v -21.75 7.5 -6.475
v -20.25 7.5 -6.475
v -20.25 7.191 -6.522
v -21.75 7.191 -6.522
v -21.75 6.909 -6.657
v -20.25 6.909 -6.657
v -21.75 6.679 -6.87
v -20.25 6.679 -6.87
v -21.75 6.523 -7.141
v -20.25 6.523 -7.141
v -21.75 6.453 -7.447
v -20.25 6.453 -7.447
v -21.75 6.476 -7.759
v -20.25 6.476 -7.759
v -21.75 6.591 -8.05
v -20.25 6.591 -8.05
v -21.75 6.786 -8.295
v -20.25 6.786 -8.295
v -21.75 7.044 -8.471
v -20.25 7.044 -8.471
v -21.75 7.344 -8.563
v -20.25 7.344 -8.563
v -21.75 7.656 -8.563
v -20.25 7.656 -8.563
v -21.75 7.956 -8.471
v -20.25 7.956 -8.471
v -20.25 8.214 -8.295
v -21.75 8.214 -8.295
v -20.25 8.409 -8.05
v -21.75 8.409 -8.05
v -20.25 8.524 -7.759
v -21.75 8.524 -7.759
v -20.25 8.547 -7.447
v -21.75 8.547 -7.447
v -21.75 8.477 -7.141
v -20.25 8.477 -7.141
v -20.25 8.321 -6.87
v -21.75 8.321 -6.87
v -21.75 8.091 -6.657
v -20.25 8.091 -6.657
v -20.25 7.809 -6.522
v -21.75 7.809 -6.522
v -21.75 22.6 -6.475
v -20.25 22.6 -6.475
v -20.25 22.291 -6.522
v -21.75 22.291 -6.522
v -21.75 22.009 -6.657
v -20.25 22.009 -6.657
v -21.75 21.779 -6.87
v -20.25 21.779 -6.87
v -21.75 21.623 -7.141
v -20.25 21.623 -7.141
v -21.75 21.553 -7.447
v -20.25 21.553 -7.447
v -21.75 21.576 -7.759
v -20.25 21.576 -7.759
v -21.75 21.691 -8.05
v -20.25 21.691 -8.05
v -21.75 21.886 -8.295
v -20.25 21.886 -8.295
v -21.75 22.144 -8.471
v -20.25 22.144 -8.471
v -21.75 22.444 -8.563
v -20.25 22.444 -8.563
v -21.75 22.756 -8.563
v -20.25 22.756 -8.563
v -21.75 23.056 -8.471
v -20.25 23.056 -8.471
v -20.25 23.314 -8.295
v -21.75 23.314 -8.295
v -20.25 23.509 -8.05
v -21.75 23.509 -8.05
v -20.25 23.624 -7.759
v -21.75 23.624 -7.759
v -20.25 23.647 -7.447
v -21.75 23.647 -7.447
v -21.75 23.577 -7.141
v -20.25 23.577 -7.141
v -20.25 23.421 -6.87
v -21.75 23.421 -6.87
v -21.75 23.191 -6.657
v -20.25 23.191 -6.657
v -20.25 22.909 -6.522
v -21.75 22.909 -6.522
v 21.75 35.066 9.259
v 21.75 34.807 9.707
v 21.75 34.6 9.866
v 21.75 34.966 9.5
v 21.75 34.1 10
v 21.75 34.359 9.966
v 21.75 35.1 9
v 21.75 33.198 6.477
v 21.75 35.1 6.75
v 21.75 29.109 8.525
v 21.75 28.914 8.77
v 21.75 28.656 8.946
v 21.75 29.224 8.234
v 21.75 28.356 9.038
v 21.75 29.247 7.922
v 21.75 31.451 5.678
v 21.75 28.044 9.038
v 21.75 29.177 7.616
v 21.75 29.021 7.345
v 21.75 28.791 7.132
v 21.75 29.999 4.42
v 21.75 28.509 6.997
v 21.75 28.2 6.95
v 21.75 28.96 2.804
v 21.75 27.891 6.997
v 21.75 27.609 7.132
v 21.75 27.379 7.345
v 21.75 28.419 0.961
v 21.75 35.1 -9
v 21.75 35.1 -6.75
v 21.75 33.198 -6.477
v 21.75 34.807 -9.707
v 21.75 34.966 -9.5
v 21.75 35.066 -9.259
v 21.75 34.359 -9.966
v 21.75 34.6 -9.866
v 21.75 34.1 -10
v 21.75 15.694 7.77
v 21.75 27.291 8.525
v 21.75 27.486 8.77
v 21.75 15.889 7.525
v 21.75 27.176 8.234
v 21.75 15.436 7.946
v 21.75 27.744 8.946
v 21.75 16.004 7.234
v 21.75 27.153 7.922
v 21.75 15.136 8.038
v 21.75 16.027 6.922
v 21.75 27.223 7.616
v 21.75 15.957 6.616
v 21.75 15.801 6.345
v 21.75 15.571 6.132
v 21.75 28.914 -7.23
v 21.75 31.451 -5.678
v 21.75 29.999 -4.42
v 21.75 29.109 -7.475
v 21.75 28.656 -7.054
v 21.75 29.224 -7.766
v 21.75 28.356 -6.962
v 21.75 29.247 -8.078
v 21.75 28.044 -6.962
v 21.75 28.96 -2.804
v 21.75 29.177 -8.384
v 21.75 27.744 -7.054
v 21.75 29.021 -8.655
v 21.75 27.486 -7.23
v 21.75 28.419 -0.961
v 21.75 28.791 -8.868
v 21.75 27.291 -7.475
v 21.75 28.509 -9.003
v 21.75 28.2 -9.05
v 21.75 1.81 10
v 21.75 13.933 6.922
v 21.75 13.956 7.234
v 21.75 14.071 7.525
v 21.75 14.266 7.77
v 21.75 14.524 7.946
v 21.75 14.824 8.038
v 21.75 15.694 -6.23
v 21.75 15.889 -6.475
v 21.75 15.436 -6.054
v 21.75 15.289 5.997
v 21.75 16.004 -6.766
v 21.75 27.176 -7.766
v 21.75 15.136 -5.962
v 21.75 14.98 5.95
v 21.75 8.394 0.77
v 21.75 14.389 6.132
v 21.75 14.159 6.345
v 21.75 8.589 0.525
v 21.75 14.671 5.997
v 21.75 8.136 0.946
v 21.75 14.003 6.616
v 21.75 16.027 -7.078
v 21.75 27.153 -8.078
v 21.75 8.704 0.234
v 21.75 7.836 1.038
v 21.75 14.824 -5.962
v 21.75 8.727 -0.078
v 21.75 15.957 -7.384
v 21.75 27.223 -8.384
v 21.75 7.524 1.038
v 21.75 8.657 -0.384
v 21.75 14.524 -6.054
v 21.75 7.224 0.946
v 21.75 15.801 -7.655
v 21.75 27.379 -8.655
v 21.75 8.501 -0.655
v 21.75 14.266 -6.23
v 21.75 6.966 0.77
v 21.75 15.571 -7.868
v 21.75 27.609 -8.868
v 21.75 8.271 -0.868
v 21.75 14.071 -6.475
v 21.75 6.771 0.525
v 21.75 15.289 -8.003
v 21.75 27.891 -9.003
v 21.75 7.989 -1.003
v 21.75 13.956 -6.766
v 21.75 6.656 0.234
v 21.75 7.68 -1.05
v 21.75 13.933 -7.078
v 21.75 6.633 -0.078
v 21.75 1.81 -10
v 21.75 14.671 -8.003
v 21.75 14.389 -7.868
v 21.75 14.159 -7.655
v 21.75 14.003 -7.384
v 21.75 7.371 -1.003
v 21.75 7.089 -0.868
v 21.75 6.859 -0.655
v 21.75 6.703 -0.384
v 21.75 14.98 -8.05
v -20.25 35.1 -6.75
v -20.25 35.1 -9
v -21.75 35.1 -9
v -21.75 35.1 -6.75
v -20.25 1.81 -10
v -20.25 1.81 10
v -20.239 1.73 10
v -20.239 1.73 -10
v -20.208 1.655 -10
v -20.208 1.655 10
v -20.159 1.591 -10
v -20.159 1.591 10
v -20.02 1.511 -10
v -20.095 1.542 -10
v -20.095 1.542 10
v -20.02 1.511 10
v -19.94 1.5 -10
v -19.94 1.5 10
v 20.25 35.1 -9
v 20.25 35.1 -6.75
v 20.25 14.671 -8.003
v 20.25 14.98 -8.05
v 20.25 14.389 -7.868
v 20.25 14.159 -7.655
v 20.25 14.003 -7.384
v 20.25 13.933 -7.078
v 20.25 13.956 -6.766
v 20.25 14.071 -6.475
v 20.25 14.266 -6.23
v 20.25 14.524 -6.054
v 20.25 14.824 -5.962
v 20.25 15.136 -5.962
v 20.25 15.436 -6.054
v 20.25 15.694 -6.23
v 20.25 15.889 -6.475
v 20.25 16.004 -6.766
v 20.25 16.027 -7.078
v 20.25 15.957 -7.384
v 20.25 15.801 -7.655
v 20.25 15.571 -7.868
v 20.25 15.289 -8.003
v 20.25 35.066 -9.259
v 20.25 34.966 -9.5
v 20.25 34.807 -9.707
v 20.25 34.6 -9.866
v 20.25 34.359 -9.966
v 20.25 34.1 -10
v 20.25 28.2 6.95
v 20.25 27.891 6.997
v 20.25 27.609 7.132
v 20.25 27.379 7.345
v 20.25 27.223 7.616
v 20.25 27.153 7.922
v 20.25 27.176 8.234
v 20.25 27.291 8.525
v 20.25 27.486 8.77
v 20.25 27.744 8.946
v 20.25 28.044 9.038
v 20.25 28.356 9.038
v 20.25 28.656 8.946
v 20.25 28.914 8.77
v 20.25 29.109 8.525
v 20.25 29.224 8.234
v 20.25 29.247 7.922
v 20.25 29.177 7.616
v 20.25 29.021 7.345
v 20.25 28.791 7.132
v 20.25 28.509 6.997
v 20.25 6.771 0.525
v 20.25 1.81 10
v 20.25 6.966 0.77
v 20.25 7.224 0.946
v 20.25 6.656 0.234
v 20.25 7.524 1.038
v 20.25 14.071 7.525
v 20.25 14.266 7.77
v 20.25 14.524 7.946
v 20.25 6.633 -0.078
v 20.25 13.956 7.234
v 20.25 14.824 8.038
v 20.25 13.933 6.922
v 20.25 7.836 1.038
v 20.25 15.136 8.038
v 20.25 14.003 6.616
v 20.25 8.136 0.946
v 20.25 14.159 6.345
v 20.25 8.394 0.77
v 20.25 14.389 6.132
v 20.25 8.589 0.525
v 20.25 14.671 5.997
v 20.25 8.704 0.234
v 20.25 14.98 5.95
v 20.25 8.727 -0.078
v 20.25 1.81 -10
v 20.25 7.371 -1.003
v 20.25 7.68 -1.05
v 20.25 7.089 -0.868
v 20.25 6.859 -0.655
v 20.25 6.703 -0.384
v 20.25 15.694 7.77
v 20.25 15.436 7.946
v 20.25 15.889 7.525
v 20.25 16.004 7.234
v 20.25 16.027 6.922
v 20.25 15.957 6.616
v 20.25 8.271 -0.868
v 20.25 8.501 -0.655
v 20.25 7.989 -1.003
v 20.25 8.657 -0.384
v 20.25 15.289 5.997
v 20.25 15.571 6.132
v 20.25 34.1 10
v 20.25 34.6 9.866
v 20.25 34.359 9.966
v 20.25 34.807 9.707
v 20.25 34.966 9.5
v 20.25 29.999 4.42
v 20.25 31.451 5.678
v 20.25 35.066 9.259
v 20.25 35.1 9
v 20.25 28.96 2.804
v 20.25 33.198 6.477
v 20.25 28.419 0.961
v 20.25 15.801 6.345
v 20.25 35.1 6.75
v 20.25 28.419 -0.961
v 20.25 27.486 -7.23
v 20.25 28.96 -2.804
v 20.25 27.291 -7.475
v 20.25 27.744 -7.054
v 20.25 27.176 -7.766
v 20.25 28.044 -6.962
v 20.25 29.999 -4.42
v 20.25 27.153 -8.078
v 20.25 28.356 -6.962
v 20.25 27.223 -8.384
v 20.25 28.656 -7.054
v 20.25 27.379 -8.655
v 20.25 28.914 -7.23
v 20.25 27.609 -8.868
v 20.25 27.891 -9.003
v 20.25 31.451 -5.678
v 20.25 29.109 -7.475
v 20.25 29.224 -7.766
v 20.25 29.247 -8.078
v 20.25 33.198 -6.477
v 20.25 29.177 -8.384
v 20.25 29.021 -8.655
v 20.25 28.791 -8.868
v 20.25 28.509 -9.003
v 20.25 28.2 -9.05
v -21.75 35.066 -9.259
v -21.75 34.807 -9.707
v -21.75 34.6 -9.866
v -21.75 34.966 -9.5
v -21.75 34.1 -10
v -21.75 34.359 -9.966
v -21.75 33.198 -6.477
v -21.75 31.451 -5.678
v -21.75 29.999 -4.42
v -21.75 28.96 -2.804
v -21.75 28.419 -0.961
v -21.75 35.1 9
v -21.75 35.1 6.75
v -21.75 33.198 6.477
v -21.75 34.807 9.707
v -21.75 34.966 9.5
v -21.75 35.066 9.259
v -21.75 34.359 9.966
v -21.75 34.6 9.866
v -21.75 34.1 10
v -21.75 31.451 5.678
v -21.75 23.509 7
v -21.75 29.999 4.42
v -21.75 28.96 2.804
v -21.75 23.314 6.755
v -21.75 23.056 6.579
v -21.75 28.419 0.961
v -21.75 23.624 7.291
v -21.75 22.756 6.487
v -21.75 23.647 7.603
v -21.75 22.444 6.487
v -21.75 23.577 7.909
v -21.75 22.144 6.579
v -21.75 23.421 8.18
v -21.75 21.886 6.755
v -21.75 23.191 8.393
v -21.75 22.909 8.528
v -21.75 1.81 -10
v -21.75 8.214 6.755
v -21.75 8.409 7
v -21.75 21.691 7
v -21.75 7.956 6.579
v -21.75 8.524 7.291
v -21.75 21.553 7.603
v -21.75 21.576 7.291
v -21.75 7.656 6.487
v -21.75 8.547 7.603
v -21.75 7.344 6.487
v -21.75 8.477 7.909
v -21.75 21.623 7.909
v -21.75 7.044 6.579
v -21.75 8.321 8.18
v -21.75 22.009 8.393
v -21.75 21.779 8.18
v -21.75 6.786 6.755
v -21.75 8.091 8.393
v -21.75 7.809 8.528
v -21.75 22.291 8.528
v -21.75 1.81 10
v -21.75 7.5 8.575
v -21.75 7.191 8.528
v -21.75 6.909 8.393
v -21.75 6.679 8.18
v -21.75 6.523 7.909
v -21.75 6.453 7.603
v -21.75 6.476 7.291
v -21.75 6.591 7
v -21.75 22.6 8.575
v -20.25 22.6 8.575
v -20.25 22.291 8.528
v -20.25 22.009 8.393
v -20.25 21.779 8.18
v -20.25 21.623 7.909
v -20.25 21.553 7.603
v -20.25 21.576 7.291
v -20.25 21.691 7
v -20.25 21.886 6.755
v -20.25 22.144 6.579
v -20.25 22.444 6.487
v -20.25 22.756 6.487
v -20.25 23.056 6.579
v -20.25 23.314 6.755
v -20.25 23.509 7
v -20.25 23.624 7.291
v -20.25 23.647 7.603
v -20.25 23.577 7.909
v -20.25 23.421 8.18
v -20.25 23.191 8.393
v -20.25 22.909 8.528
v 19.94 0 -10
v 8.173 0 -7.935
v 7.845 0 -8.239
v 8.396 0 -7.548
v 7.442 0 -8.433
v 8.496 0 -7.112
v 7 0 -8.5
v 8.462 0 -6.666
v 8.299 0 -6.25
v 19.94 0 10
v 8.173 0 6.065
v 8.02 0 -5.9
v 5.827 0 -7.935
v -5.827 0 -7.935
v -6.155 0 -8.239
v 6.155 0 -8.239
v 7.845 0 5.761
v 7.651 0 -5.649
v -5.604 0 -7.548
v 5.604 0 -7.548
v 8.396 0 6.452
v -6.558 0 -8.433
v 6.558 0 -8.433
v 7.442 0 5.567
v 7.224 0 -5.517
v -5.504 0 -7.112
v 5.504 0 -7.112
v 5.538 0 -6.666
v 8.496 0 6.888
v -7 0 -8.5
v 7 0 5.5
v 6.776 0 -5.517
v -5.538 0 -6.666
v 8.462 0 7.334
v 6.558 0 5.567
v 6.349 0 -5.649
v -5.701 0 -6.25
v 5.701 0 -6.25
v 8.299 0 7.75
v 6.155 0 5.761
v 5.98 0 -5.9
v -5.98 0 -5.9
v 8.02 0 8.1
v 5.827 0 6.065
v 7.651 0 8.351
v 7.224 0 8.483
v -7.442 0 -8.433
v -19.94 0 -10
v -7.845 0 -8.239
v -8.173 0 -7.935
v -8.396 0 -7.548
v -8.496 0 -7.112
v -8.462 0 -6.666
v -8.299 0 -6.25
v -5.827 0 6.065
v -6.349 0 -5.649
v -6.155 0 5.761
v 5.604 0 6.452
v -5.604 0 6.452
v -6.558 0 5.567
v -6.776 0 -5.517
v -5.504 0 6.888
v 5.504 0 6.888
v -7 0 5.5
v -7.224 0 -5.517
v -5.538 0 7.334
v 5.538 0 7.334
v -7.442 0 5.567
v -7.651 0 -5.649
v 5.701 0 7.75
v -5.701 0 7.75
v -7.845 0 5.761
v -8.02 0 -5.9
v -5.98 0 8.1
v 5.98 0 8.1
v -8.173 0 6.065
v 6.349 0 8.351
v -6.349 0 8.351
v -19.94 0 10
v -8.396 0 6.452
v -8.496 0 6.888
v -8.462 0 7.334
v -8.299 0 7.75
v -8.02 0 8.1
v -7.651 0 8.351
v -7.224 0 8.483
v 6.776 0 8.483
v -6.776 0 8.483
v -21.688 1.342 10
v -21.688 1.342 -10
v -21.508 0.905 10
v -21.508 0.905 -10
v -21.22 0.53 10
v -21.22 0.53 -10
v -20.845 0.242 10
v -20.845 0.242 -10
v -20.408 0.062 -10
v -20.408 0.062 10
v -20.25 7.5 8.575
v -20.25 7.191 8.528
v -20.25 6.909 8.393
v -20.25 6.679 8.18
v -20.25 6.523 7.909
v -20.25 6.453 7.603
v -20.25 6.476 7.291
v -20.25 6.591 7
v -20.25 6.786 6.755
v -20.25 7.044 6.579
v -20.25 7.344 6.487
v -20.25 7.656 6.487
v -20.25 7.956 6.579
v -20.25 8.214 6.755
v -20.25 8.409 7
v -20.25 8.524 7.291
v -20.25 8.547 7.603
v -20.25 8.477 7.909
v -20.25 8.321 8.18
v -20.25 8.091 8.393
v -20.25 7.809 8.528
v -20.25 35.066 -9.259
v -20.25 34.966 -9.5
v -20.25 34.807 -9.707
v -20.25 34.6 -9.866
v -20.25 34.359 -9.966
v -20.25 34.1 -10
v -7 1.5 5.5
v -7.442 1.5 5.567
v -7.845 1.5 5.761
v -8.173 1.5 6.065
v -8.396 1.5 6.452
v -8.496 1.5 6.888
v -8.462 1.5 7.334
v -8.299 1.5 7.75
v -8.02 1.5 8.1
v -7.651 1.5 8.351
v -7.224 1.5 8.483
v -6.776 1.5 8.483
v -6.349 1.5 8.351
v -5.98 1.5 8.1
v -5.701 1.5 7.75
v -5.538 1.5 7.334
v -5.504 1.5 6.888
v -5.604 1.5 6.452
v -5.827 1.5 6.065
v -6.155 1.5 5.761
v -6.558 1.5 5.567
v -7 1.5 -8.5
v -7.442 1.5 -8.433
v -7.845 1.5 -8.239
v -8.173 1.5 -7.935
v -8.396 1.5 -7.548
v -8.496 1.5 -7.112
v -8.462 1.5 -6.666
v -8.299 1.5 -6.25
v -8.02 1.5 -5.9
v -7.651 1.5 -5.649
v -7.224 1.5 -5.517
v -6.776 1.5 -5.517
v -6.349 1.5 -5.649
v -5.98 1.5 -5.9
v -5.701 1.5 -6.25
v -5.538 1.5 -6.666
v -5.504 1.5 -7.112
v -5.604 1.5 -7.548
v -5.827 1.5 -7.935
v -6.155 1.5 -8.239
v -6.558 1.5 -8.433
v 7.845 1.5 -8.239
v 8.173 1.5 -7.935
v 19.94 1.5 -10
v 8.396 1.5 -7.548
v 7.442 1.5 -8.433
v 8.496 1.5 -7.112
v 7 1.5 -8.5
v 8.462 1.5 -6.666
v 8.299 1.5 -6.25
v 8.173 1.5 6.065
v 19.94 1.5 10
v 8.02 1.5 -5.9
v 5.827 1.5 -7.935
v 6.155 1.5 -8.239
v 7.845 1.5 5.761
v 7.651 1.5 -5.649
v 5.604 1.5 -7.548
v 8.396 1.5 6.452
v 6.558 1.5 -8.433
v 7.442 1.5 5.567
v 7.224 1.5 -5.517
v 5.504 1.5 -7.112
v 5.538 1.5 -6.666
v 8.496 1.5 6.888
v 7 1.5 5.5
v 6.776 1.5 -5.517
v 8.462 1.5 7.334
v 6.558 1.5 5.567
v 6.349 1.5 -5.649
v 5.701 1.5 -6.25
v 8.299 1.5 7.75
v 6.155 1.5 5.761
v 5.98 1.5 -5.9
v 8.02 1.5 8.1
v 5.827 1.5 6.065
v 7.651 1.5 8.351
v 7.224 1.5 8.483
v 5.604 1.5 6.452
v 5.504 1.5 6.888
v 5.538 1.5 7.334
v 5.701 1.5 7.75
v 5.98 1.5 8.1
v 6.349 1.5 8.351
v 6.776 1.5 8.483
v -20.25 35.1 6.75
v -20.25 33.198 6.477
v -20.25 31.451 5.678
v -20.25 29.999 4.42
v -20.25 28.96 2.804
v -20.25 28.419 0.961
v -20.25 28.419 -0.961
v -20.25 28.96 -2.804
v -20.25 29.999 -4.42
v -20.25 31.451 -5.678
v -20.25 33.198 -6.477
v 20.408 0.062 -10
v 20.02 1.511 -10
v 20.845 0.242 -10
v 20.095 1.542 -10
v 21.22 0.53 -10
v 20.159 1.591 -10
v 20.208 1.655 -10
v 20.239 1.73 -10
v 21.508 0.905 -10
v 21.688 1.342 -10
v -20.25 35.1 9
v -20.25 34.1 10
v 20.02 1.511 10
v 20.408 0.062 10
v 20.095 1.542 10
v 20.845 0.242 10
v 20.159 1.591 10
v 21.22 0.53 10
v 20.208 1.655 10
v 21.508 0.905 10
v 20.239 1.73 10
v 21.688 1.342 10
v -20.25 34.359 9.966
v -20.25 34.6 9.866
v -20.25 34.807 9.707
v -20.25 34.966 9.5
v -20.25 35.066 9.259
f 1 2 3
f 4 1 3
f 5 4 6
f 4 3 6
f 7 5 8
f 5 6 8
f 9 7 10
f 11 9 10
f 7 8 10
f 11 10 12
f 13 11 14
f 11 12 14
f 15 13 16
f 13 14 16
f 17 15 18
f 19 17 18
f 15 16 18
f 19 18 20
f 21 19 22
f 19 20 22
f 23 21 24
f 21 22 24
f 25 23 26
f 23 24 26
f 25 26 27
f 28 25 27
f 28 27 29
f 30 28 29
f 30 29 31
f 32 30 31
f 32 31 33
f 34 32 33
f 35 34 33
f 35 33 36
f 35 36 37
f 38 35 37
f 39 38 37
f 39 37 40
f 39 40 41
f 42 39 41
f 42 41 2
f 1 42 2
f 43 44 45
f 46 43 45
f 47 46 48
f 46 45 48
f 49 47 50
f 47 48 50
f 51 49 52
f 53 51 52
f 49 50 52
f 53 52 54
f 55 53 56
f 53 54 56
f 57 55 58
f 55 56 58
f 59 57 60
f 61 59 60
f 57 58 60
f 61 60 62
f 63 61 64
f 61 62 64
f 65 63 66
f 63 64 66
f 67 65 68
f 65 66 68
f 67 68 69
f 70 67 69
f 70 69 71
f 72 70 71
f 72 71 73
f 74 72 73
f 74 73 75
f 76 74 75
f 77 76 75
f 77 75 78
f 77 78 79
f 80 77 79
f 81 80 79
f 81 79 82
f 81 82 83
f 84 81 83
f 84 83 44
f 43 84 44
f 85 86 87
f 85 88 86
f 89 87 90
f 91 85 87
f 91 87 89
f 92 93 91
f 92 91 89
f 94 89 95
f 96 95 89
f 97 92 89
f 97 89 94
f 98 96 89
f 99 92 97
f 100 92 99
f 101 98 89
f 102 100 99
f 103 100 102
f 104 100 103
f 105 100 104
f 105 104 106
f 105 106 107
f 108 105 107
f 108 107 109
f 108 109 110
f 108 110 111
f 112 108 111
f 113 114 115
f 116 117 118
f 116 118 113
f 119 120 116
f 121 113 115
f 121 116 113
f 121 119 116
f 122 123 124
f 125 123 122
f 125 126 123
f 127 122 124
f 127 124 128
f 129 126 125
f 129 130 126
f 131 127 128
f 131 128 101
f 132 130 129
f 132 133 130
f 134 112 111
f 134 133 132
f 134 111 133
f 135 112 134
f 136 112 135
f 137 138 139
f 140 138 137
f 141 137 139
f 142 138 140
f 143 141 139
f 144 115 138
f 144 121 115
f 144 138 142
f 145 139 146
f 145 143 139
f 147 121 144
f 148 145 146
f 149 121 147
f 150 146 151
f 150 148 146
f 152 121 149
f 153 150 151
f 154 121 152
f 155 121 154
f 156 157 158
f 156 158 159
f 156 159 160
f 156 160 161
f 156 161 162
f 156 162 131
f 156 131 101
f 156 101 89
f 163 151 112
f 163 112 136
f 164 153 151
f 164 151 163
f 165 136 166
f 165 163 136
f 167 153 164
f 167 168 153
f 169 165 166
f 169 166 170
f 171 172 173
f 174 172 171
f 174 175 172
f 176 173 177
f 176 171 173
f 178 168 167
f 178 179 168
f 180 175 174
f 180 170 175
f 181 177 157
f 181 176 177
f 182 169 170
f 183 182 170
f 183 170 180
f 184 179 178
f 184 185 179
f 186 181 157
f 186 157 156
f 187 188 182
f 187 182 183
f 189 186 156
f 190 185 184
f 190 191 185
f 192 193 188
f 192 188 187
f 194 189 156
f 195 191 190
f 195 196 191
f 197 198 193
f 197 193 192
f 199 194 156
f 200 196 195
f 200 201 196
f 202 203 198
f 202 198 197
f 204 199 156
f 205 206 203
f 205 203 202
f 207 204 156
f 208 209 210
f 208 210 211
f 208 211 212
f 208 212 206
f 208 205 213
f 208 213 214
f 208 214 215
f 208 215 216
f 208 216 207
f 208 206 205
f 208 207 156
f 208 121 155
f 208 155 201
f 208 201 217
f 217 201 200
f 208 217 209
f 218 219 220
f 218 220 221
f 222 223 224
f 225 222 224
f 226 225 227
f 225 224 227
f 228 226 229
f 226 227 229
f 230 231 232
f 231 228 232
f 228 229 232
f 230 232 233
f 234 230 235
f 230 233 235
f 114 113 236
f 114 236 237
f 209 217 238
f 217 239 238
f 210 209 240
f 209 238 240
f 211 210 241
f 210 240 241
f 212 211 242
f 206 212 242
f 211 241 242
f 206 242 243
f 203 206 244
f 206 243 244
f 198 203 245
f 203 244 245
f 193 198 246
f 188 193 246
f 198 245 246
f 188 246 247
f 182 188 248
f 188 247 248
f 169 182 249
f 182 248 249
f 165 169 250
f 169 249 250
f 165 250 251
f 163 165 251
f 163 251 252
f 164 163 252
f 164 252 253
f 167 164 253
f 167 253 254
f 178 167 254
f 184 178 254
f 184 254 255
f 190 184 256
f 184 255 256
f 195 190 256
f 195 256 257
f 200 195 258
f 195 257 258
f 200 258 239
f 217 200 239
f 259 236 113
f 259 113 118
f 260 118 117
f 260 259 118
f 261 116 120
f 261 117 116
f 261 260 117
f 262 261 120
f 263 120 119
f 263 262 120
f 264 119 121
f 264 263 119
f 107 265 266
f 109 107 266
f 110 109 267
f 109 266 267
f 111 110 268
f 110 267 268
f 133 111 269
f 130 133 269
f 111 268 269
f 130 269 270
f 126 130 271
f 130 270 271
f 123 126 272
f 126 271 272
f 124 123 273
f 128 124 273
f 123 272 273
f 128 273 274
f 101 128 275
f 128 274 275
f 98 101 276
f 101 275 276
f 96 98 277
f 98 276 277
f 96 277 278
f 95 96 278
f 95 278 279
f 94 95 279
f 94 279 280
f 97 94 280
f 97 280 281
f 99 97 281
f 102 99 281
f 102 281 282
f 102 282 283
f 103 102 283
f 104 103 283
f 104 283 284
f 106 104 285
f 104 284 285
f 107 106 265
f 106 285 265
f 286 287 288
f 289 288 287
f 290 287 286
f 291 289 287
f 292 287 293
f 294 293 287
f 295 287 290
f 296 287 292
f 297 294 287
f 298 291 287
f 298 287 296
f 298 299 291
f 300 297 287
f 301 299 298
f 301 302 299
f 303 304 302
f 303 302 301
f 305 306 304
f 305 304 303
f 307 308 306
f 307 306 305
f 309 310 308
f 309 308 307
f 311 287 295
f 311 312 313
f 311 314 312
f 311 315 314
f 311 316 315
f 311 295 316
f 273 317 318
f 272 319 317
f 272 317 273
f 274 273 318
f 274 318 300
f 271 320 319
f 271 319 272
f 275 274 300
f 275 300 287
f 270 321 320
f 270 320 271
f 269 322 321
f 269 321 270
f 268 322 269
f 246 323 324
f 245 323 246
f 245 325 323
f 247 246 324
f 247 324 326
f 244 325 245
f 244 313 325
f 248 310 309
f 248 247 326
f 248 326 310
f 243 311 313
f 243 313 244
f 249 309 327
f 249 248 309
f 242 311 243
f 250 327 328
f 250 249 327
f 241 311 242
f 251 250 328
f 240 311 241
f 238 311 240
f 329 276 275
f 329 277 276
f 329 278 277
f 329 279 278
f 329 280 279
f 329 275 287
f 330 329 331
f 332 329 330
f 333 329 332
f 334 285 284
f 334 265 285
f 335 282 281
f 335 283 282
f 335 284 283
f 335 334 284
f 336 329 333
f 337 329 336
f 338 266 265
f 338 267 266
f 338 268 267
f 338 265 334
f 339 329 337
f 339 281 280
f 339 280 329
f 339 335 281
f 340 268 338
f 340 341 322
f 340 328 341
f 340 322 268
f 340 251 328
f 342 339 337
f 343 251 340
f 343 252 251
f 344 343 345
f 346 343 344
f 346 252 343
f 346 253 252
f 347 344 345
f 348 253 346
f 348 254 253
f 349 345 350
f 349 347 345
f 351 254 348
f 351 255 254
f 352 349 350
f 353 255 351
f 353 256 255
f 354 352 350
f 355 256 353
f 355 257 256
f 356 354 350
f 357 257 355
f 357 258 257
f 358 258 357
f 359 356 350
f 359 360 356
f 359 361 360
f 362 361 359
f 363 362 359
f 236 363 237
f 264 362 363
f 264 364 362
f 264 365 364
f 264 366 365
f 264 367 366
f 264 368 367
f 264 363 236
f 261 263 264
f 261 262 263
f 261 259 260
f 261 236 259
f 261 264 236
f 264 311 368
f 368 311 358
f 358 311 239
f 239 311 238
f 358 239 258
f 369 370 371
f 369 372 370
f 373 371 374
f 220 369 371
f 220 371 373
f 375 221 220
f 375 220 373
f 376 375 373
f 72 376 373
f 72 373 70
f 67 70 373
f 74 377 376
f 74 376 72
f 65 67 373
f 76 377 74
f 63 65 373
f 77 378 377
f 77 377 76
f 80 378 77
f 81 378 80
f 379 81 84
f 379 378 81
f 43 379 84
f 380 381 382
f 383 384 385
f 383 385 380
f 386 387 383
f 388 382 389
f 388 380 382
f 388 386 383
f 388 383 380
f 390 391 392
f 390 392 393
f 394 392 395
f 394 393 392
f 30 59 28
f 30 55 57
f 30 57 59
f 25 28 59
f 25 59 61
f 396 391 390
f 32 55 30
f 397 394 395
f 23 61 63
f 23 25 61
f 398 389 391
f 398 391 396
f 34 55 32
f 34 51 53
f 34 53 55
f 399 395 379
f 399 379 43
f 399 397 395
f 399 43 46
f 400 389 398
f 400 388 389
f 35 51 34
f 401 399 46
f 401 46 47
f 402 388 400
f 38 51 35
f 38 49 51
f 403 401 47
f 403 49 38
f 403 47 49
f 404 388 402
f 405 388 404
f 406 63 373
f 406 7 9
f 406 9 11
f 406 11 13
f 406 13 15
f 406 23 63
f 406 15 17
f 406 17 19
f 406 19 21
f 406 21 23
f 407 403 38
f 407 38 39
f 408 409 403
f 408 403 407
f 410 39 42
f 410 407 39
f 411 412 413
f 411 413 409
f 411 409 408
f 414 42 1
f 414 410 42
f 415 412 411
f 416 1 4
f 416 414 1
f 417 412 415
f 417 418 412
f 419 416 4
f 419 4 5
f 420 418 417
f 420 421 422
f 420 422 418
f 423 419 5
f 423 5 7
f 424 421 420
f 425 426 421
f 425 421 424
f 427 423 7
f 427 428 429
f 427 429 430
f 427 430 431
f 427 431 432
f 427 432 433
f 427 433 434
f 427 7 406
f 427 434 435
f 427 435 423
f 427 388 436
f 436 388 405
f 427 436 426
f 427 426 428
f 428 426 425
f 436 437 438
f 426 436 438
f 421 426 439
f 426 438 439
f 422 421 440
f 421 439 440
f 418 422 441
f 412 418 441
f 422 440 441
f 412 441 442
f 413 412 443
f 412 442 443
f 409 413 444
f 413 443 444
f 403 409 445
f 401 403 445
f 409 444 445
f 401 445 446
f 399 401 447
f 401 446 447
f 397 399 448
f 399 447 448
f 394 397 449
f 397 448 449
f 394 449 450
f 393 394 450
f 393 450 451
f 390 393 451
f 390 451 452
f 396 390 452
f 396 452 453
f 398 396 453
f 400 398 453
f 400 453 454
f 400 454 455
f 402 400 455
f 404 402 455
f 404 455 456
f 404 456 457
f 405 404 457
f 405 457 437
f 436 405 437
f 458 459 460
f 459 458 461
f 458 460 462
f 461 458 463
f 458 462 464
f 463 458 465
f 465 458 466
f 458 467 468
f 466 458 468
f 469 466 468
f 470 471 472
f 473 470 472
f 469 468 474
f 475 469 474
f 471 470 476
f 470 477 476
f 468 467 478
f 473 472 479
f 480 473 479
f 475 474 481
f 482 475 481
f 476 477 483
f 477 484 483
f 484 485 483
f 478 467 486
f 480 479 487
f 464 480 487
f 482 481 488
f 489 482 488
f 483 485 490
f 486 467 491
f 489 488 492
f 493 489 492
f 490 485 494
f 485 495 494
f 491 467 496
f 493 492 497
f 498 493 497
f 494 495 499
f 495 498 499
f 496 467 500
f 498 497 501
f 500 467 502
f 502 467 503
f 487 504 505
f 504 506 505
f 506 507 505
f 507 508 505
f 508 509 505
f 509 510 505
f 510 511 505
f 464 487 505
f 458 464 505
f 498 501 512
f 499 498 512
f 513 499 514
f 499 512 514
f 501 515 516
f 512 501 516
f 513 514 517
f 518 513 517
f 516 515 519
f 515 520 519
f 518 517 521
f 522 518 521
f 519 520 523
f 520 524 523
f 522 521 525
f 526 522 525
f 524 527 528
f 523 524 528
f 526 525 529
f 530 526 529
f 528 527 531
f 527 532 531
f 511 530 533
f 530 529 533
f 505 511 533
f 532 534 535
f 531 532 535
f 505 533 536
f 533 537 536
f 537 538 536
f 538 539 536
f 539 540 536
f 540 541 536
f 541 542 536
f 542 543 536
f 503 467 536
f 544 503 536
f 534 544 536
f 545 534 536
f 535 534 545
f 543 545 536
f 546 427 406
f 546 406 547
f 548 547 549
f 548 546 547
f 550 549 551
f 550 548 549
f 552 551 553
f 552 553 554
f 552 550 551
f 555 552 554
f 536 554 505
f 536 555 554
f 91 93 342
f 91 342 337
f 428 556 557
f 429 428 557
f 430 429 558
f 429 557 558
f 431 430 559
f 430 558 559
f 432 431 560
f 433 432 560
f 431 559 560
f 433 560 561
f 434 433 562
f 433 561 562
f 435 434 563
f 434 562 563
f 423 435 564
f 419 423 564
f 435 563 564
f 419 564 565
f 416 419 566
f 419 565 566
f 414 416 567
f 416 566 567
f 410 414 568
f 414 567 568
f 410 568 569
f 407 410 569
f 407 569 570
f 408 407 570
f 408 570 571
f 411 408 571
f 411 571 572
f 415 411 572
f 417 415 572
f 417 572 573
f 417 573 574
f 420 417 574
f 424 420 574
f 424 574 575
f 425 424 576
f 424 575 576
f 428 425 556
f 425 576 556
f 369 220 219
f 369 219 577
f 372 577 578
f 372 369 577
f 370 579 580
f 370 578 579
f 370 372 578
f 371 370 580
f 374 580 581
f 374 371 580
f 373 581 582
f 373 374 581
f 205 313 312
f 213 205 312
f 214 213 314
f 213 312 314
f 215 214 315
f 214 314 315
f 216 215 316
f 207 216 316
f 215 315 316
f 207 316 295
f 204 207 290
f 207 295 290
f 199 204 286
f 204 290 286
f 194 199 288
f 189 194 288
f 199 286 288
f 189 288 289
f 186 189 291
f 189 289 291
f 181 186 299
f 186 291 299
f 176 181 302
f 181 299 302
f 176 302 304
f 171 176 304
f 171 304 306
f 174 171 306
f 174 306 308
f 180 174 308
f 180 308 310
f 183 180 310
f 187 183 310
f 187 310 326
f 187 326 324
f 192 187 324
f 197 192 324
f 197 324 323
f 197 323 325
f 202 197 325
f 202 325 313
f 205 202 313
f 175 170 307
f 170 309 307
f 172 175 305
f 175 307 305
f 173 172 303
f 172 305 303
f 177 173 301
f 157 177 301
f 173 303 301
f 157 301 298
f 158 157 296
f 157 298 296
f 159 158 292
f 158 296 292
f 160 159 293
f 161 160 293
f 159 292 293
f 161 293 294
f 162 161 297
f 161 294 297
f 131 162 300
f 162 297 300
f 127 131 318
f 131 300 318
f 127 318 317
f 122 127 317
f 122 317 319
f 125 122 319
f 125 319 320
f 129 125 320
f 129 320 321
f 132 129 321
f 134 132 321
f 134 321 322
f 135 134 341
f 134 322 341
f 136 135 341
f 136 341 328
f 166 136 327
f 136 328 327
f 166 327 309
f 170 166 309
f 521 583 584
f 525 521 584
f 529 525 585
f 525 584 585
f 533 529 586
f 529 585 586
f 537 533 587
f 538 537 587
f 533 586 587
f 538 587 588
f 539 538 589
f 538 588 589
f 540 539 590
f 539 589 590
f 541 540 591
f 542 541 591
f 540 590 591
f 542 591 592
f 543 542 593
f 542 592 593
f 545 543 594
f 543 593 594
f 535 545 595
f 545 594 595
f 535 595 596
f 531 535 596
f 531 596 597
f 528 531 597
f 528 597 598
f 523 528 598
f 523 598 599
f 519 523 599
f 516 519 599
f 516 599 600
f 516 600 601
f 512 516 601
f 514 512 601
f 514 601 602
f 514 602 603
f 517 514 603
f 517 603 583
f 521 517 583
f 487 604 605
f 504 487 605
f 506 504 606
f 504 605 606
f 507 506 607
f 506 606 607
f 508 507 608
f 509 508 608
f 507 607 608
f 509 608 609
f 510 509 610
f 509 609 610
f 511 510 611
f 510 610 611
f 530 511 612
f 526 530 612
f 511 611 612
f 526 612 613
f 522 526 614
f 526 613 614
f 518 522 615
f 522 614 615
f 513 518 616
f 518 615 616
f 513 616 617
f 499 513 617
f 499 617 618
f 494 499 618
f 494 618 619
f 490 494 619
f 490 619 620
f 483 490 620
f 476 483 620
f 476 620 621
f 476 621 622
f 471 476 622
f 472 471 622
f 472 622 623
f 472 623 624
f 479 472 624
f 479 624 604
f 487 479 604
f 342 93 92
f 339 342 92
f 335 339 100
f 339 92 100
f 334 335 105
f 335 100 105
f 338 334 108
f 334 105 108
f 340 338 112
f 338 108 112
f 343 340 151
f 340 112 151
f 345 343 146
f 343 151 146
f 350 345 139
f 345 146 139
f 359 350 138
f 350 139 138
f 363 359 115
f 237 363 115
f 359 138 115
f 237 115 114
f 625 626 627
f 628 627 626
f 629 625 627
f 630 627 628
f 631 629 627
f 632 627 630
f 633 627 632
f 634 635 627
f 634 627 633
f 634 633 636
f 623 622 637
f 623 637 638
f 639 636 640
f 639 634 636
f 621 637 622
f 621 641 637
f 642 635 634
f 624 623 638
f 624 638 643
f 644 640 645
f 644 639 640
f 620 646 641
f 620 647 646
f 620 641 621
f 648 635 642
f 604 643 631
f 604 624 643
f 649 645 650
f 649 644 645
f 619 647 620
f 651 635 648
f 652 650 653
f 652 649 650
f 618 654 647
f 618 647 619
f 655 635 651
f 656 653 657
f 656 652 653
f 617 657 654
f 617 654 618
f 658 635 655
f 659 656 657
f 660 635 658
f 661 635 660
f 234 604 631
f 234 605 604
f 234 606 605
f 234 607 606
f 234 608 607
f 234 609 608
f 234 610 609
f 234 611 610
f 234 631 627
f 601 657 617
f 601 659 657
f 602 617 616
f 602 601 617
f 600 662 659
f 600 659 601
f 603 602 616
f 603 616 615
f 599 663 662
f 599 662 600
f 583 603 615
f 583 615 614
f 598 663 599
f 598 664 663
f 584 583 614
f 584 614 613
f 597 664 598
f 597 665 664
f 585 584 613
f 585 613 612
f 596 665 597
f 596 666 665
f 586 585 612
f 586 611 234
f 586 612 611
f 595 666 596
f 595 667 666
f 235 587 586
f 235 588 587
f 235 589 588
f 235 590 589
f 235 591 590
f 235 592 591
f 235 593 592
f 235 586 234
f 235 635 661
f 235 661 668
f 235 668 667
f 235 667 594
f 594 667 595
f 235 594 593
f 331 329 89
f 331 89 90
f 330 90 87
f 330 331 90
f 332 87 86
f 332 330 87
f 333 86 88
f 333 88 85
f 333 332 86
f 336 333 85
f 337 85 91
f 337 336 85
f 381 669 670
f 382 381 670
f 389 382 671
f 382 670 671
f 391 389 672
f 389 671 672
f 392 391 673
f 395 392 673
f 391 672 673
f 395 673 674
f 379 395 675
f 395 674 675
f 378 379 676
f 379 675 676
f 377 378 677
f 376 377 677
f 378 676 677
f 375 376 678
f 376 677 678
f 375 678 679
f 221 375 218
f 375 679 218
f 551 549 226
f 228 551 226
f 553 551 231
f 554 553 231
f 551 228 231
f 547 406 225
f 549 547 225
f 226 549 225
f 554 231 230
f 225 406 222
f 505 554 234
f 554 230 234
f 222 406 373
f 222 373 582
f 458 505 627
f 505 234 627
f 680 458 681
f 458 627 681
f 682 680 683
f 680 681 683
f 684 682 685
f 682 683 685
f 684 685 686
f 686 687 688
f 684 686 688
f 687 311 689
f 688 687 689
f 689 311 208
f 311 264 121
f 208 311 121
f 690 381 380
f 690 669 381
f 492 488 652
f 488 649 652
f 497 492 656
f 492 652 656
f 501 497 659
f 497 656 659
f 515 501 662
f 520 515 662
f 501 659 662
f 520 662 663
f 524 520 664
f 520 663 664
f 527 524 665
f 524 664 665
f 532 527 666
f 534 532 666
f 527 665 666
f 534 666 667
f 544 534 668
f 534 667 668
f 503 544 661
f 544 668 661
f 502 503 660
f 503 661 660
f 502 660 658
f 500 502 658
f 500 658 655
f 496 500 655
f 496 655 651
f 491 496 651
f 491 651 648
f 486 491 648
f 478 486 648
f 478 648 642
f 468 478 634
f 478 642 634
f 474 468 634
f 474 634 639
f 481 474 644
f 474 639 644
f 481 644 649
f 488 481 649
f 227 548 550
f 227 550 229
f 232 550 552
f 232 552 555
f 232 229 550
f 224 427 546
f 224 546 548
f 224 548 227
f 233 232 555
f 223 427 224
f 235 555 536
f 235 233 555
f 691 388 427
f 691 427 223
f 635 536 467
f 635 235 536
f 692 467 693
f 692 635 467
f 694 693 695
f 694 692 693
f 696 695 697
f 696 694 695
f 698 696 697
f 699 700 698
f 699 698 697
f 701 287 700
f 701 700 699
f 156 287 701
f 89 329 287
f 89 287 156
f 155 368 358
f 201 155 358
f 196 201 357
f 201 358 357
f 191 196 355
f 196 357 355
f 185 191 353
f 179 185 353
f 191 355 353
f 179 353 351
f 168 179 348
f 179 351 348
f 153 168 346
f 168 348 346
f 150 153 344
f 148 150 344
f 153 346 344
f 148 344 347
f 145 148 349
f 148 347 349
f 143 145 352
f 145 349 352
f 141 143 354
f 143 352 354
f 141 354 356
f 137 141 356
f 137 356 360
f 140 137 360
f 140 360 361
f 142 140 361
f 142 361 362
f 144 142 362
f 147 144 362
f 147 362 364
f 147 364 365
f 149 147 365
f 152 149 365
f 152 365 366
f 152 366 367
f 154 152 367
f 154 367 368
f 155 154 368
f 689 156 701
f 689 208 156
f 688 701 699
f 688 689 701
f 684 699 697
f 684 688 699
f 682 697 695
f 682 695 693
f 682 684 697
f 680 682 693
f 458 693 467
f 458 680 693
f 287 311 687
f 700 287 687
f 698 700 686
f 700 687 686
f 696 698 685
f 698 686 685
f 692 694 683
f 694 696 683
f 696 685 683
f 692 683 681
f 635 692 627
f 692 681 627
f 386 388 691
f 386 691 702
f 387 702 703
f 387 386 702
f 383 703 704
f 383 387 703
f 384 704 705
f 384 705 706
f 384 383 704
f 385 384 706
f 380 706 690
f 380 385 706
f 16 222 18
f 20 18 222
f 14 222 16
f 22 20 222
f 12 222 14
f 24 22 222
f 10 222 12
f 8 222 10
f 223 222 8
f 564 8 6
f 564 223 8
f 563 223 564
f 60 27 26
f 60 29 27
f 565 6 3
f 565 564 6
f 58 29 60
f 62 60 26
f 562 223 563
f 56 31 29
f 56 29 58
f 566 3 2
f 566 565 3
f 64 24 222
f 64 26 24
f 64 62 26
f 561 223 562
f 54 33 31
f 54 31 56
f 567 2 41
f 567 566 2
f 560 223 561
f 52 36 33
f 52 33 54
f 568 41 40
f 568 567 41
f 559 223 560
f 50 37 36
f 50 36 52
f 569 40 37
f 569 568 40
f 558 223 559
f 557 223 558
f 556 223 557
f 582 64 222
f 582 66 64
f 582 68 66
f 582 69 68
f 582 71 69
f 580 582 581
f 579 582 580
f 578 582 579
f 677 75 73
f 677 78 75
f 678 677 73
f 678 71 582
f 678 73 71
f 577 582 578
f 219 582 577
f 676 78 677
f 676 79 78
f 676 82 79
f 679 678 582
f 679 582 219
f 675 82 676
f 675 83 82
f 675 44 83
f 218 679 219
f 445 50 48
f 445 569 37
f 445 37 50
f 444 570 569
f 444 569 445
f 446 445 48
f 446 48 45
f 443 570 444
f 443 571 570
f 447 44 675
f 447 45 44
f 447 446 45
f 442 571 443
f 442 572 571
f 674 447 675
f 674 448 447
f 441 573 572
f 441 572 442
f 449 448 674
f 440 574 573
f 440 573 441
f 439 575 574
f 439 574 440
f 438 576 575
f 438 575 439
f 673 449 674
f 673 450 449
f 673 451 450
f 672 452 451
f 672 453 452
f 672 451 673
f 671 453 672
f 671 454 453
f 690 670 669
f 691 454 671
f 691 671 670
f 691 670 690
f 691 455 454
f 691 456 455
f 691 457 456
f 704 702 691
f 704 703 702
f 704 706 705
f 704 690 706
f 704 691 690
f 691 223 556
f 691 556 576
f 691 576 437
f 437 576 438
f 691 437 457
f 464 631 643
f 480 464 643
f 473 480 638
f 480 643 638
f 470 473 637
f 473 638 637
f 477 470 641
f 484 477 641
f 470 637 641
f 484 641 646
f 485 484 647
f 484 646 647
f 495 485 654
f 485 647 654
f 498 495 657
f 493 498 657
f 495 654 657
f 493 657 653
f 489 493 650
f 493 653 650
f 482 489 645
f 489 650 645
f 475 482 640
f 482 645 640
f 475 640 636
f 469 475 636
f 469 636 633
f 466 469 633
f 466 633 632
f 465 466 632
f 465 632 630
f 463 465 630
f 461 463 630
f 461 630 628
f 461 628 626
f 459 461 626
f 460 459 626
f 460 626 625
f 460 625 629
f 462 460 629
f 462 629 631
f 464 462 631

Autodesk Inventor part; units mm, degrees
ref_plane "YZ Plane" through (0, 0, 0) normal (1, 0, 0) x (0, 1, 0)
ref_plane "XZ Plane" through (0, 0, 0) normal (0, 1, 0) x (-1, 0, 0)
ref_plane "XY Plane" through (0, 0, 0) normal (0, 0, 1) x (1, 0, 0)
sketch "Sketch1" plane through (0, 0, 0) normal (0, 1, 0) x (-1, 0, 0)
  line L0 (20.25, -10) -> (-20.25, -10)
  line L1 (-20.25, -10) -> (-20.25, 10)
  line L2 (-20.25, 10) -> (20.25, 10)
  line L3 (20.25, 10) -> (20.25, -10)
  point P0 (0, 0)
  dimension "d0" = 40.5
  dimension "d1" = 20
  dimension "d2" = 10
  dimension "d3" = 20.25
extrude "Plate1" add sketch "Sketch1" along normal blind 1.5
sketch "Sketch2" plane through (21.75, 0, -10) normal (-1, 0, 0) x (0, -1, 0)
  line L0 (0, 20) -> (0, 0)
  line L1 (0, 0) -> (-45, 0)
  line L2 (-45, 0) -> (-45, 20)
  line L3 (-45, 20) -> (0, 20)
edge flange "Flange1" height 45 angle 90 thickness 1.5 bend radius 0.31 thickness toward (-1, 0, 0) relief tear relief width 1.5 relief depth 0.75 edges at (20.25, 1.5, 0) wall of the first edge with corners at (21.75, 0, 10) (21.75, 0, -10) (21.75, 45, -10) (21.75, 45, 10)
bend "Bend1"
corner "Corner1"
sketch "Sketch3" plane through (-21.75, 0, 10) normal (1, 0, 0) x (0, 1, 0)
  line L0 (0, -20) -> (0, 0)
  line L1 (0, 0) -> (45, 0)
  line L2 (45, 0) -> (45, -20)
  line L3 (45, -20) -> (0, -20)
edge flange "Flange2" height 45 angle 90 thickness 1.5 bend radius 0.31 thickness toward (1, 0, 0) relief tear relief width 1.5 relief depth 0.75 edges at (-20.25, 1.5, 0) wall of the first edge with corners at (-21.75, 0, -10) (-21.75, 0, 10) (-21.75, 45, 10) (-21.75, 45, -10)
bend "Bend2"
corner "Corner2"
sketch "Sketch4" plane through (21.75, 45, 10) normal (1, 0, 0) x (0, 0, -1)
  circle A0 centre (10, -9.9) radius 6.75
  line L0 (0, 0) -> (20, 0) projected
  line L1 (20, 0) -> (20, -43.19) projected
  point P0 (10, -45)
  dimension "d25" = 9.9
  dimension "d26" = 13.5
  dimension "d27" = 10
extrude "Extrusion1" cut sketch "Sketch4" against normal blind 50
sketch "Sketch5" plane through (21.75, 45, 10) normal (1, 0, 0) x (0, 0, -1)
  circle A0 centre (10, -9.9) radius 6.75 projected
  line L0 (0, 0) -> (20, 0) projected
  line L1 (-4, 0) -> (24, 0)
  line L2 (24, 0) -> (24, -9.9)
  line L3 (24, -9.9) -> (-4, -9.9)
  line L4 (-4, -9.9) -> (-4, 0)
  line L5 (0, -43.19) -> (0, 0) projected
  point P0 (10, -45)
  dimension "d30" = 9.9
  dimension "d31" = 28
  dimension "d32" = 4
extrude "Extrusion2" cut sketch "Sketch5" against normal blind 50 contours L3 A0 | A0 L3 L5 L0 L1 L2 | L3 L4 L1 L5 picked at (11.6841, -8.408)
fillet "Fillet1" radius 1 4 edges at (-21, 35.1, 10) (-21, 35.1, -10) (21, 35.1, -10) (21, 35.1, 10)
sketch "Sketch8" plane through (0, 0, 0) normal (0, -1, 0) x (1, 0, 0)
  circle A0 centre (8, -8) radius 1.05 projected
  circle A1 centre (-8, -8) radius 1.05 projected
  circle A2 centre (8, 8) radius 1.05 projected
  circle A3 centre (-8, 8) radius 1.05 projected
  circle A4 centre (-7, -7) radius 1.5
  line L0 (-9.33, -10.07) -> (7.53, -10.07)
  line L1 (10.07, -8.5) -> (10.07, 29.6)
  circle A5 centre (7, -7) radius 1.5
  circle A6 centre (-7, 7) radius 1.5
  circle A7 centre (7, 7) radius 1.5
  point P0 (0, 0)
  dimension "d71" = 7
  dimension "d72" = 7
  dimension "d73" = 3
  dimension "d76" = 14
  dimension "d79" = 14
hole "Hole3" at (-7, 0, -7) at (-7, 0, 7) at (7, 0, 7) at (7, 0, -7) direction (0, 1, 0) diameter 3 depth 1.5
sketch "Sketch9" plane through (-21.75, 1.81, -10) normal (-1, 0, 0) x (0, 0, 1)
  circle A0 centre (17.525, 20.79) radius 0.7835 projected
  circle A1 centre (17.525, 5.69) radius 0.7835 projected
  circle A2 centre (2.475, 20.79) radius 0.7835 projected
  circle A3 centre (2.475, 5.69) radius 0.7835 projected
  point P0 (10, -1.81)
hole "Hole4" at (-21.75, 7.5, 7.525) at (-21.75, 7.5, -7.525) at (-21.75, 22.6, -7.525) at (-21.75, 22.6, 7.525) direction (1, 0, 0) diameter 2.1 depth 1.5
sketch "Sketch10" plane through (21.75, 1.81, 10) normal (1, 0, 0) x (0, 0, -1)
  circle A0 centre (3, 13.17) radius 0.7835 projected
  circle A1 centre (10, 5.87) radius 0.7835 projected
  circle A2 centre (17, 13.17) radius 0.7835 projected
  circle A3 centre (2, 26.39) radius 0.7835 projected
  circle A4 centre (18, 26.39) radius 0.7835 projected
  point P0 (10, -1.81)
hole "Hole5" at (21.75, 28.2, 8) at (21.75, 28.2, -8) at (21.75, 14.98, -7) at (21.75, 7.68, 0) at (21.75, 14.98, 7) direction (-1, 0, 0) diameter 2.1 depth 1.5
equation "\"d55\" = Thickness"
equation "\"d62\" = Thickness"
equation "\"d69\" = Thickness"
equation "\"d4\" = Thickness"
equation "\"d5\" = BendReliefWidth"
equation "\"d6\" = BendReliefDepth"
equation "\"d7\" = MinimumRemnant"
equation "\"d8\" = TransitionRadius"
equation "\"d11\" = BendRadius"
equation "\"d12\" = CornerReliefSize"
equation "\"d13\" = GapSize"
equation "\"d14\" = JacobiRadiusSize"
equation "\"d15\" = BendReliefWidth"
equation "\"d16\" = BendReliefDepth"
equation "\"d17\" = MinimumRemnant"
equation "\"d18\" = TransitionRadius"
equation "\"d21\" = BendRadius"
equation "\"d22\" = CornerReliefSize"
equation "\"d23\" = GapSize"
equation "\"d24\" = JacobiRadiusSize"
equation "\"BendReliefWidth\" = Thickness"
equation "\"BendReliefDepth\" = 0.5 * Thickness"
equation "\"CornerReliefSize\" = 4 * Thickness"
equation "\"MinimumRemnant\" = 2 * Thickness"
equation "\"TransitionRadius\" = BendRadius"
equation "\"JacobiRadiusSize\" = BendRadius"
equation "\"GapSize\" = Thickness"
equation "\"Thickness\" = 1.5"
equation "\"BendRadius\" = 0.31"
properties part number "axis_10_top_frame" material "Aluminum 6061-AHC"
